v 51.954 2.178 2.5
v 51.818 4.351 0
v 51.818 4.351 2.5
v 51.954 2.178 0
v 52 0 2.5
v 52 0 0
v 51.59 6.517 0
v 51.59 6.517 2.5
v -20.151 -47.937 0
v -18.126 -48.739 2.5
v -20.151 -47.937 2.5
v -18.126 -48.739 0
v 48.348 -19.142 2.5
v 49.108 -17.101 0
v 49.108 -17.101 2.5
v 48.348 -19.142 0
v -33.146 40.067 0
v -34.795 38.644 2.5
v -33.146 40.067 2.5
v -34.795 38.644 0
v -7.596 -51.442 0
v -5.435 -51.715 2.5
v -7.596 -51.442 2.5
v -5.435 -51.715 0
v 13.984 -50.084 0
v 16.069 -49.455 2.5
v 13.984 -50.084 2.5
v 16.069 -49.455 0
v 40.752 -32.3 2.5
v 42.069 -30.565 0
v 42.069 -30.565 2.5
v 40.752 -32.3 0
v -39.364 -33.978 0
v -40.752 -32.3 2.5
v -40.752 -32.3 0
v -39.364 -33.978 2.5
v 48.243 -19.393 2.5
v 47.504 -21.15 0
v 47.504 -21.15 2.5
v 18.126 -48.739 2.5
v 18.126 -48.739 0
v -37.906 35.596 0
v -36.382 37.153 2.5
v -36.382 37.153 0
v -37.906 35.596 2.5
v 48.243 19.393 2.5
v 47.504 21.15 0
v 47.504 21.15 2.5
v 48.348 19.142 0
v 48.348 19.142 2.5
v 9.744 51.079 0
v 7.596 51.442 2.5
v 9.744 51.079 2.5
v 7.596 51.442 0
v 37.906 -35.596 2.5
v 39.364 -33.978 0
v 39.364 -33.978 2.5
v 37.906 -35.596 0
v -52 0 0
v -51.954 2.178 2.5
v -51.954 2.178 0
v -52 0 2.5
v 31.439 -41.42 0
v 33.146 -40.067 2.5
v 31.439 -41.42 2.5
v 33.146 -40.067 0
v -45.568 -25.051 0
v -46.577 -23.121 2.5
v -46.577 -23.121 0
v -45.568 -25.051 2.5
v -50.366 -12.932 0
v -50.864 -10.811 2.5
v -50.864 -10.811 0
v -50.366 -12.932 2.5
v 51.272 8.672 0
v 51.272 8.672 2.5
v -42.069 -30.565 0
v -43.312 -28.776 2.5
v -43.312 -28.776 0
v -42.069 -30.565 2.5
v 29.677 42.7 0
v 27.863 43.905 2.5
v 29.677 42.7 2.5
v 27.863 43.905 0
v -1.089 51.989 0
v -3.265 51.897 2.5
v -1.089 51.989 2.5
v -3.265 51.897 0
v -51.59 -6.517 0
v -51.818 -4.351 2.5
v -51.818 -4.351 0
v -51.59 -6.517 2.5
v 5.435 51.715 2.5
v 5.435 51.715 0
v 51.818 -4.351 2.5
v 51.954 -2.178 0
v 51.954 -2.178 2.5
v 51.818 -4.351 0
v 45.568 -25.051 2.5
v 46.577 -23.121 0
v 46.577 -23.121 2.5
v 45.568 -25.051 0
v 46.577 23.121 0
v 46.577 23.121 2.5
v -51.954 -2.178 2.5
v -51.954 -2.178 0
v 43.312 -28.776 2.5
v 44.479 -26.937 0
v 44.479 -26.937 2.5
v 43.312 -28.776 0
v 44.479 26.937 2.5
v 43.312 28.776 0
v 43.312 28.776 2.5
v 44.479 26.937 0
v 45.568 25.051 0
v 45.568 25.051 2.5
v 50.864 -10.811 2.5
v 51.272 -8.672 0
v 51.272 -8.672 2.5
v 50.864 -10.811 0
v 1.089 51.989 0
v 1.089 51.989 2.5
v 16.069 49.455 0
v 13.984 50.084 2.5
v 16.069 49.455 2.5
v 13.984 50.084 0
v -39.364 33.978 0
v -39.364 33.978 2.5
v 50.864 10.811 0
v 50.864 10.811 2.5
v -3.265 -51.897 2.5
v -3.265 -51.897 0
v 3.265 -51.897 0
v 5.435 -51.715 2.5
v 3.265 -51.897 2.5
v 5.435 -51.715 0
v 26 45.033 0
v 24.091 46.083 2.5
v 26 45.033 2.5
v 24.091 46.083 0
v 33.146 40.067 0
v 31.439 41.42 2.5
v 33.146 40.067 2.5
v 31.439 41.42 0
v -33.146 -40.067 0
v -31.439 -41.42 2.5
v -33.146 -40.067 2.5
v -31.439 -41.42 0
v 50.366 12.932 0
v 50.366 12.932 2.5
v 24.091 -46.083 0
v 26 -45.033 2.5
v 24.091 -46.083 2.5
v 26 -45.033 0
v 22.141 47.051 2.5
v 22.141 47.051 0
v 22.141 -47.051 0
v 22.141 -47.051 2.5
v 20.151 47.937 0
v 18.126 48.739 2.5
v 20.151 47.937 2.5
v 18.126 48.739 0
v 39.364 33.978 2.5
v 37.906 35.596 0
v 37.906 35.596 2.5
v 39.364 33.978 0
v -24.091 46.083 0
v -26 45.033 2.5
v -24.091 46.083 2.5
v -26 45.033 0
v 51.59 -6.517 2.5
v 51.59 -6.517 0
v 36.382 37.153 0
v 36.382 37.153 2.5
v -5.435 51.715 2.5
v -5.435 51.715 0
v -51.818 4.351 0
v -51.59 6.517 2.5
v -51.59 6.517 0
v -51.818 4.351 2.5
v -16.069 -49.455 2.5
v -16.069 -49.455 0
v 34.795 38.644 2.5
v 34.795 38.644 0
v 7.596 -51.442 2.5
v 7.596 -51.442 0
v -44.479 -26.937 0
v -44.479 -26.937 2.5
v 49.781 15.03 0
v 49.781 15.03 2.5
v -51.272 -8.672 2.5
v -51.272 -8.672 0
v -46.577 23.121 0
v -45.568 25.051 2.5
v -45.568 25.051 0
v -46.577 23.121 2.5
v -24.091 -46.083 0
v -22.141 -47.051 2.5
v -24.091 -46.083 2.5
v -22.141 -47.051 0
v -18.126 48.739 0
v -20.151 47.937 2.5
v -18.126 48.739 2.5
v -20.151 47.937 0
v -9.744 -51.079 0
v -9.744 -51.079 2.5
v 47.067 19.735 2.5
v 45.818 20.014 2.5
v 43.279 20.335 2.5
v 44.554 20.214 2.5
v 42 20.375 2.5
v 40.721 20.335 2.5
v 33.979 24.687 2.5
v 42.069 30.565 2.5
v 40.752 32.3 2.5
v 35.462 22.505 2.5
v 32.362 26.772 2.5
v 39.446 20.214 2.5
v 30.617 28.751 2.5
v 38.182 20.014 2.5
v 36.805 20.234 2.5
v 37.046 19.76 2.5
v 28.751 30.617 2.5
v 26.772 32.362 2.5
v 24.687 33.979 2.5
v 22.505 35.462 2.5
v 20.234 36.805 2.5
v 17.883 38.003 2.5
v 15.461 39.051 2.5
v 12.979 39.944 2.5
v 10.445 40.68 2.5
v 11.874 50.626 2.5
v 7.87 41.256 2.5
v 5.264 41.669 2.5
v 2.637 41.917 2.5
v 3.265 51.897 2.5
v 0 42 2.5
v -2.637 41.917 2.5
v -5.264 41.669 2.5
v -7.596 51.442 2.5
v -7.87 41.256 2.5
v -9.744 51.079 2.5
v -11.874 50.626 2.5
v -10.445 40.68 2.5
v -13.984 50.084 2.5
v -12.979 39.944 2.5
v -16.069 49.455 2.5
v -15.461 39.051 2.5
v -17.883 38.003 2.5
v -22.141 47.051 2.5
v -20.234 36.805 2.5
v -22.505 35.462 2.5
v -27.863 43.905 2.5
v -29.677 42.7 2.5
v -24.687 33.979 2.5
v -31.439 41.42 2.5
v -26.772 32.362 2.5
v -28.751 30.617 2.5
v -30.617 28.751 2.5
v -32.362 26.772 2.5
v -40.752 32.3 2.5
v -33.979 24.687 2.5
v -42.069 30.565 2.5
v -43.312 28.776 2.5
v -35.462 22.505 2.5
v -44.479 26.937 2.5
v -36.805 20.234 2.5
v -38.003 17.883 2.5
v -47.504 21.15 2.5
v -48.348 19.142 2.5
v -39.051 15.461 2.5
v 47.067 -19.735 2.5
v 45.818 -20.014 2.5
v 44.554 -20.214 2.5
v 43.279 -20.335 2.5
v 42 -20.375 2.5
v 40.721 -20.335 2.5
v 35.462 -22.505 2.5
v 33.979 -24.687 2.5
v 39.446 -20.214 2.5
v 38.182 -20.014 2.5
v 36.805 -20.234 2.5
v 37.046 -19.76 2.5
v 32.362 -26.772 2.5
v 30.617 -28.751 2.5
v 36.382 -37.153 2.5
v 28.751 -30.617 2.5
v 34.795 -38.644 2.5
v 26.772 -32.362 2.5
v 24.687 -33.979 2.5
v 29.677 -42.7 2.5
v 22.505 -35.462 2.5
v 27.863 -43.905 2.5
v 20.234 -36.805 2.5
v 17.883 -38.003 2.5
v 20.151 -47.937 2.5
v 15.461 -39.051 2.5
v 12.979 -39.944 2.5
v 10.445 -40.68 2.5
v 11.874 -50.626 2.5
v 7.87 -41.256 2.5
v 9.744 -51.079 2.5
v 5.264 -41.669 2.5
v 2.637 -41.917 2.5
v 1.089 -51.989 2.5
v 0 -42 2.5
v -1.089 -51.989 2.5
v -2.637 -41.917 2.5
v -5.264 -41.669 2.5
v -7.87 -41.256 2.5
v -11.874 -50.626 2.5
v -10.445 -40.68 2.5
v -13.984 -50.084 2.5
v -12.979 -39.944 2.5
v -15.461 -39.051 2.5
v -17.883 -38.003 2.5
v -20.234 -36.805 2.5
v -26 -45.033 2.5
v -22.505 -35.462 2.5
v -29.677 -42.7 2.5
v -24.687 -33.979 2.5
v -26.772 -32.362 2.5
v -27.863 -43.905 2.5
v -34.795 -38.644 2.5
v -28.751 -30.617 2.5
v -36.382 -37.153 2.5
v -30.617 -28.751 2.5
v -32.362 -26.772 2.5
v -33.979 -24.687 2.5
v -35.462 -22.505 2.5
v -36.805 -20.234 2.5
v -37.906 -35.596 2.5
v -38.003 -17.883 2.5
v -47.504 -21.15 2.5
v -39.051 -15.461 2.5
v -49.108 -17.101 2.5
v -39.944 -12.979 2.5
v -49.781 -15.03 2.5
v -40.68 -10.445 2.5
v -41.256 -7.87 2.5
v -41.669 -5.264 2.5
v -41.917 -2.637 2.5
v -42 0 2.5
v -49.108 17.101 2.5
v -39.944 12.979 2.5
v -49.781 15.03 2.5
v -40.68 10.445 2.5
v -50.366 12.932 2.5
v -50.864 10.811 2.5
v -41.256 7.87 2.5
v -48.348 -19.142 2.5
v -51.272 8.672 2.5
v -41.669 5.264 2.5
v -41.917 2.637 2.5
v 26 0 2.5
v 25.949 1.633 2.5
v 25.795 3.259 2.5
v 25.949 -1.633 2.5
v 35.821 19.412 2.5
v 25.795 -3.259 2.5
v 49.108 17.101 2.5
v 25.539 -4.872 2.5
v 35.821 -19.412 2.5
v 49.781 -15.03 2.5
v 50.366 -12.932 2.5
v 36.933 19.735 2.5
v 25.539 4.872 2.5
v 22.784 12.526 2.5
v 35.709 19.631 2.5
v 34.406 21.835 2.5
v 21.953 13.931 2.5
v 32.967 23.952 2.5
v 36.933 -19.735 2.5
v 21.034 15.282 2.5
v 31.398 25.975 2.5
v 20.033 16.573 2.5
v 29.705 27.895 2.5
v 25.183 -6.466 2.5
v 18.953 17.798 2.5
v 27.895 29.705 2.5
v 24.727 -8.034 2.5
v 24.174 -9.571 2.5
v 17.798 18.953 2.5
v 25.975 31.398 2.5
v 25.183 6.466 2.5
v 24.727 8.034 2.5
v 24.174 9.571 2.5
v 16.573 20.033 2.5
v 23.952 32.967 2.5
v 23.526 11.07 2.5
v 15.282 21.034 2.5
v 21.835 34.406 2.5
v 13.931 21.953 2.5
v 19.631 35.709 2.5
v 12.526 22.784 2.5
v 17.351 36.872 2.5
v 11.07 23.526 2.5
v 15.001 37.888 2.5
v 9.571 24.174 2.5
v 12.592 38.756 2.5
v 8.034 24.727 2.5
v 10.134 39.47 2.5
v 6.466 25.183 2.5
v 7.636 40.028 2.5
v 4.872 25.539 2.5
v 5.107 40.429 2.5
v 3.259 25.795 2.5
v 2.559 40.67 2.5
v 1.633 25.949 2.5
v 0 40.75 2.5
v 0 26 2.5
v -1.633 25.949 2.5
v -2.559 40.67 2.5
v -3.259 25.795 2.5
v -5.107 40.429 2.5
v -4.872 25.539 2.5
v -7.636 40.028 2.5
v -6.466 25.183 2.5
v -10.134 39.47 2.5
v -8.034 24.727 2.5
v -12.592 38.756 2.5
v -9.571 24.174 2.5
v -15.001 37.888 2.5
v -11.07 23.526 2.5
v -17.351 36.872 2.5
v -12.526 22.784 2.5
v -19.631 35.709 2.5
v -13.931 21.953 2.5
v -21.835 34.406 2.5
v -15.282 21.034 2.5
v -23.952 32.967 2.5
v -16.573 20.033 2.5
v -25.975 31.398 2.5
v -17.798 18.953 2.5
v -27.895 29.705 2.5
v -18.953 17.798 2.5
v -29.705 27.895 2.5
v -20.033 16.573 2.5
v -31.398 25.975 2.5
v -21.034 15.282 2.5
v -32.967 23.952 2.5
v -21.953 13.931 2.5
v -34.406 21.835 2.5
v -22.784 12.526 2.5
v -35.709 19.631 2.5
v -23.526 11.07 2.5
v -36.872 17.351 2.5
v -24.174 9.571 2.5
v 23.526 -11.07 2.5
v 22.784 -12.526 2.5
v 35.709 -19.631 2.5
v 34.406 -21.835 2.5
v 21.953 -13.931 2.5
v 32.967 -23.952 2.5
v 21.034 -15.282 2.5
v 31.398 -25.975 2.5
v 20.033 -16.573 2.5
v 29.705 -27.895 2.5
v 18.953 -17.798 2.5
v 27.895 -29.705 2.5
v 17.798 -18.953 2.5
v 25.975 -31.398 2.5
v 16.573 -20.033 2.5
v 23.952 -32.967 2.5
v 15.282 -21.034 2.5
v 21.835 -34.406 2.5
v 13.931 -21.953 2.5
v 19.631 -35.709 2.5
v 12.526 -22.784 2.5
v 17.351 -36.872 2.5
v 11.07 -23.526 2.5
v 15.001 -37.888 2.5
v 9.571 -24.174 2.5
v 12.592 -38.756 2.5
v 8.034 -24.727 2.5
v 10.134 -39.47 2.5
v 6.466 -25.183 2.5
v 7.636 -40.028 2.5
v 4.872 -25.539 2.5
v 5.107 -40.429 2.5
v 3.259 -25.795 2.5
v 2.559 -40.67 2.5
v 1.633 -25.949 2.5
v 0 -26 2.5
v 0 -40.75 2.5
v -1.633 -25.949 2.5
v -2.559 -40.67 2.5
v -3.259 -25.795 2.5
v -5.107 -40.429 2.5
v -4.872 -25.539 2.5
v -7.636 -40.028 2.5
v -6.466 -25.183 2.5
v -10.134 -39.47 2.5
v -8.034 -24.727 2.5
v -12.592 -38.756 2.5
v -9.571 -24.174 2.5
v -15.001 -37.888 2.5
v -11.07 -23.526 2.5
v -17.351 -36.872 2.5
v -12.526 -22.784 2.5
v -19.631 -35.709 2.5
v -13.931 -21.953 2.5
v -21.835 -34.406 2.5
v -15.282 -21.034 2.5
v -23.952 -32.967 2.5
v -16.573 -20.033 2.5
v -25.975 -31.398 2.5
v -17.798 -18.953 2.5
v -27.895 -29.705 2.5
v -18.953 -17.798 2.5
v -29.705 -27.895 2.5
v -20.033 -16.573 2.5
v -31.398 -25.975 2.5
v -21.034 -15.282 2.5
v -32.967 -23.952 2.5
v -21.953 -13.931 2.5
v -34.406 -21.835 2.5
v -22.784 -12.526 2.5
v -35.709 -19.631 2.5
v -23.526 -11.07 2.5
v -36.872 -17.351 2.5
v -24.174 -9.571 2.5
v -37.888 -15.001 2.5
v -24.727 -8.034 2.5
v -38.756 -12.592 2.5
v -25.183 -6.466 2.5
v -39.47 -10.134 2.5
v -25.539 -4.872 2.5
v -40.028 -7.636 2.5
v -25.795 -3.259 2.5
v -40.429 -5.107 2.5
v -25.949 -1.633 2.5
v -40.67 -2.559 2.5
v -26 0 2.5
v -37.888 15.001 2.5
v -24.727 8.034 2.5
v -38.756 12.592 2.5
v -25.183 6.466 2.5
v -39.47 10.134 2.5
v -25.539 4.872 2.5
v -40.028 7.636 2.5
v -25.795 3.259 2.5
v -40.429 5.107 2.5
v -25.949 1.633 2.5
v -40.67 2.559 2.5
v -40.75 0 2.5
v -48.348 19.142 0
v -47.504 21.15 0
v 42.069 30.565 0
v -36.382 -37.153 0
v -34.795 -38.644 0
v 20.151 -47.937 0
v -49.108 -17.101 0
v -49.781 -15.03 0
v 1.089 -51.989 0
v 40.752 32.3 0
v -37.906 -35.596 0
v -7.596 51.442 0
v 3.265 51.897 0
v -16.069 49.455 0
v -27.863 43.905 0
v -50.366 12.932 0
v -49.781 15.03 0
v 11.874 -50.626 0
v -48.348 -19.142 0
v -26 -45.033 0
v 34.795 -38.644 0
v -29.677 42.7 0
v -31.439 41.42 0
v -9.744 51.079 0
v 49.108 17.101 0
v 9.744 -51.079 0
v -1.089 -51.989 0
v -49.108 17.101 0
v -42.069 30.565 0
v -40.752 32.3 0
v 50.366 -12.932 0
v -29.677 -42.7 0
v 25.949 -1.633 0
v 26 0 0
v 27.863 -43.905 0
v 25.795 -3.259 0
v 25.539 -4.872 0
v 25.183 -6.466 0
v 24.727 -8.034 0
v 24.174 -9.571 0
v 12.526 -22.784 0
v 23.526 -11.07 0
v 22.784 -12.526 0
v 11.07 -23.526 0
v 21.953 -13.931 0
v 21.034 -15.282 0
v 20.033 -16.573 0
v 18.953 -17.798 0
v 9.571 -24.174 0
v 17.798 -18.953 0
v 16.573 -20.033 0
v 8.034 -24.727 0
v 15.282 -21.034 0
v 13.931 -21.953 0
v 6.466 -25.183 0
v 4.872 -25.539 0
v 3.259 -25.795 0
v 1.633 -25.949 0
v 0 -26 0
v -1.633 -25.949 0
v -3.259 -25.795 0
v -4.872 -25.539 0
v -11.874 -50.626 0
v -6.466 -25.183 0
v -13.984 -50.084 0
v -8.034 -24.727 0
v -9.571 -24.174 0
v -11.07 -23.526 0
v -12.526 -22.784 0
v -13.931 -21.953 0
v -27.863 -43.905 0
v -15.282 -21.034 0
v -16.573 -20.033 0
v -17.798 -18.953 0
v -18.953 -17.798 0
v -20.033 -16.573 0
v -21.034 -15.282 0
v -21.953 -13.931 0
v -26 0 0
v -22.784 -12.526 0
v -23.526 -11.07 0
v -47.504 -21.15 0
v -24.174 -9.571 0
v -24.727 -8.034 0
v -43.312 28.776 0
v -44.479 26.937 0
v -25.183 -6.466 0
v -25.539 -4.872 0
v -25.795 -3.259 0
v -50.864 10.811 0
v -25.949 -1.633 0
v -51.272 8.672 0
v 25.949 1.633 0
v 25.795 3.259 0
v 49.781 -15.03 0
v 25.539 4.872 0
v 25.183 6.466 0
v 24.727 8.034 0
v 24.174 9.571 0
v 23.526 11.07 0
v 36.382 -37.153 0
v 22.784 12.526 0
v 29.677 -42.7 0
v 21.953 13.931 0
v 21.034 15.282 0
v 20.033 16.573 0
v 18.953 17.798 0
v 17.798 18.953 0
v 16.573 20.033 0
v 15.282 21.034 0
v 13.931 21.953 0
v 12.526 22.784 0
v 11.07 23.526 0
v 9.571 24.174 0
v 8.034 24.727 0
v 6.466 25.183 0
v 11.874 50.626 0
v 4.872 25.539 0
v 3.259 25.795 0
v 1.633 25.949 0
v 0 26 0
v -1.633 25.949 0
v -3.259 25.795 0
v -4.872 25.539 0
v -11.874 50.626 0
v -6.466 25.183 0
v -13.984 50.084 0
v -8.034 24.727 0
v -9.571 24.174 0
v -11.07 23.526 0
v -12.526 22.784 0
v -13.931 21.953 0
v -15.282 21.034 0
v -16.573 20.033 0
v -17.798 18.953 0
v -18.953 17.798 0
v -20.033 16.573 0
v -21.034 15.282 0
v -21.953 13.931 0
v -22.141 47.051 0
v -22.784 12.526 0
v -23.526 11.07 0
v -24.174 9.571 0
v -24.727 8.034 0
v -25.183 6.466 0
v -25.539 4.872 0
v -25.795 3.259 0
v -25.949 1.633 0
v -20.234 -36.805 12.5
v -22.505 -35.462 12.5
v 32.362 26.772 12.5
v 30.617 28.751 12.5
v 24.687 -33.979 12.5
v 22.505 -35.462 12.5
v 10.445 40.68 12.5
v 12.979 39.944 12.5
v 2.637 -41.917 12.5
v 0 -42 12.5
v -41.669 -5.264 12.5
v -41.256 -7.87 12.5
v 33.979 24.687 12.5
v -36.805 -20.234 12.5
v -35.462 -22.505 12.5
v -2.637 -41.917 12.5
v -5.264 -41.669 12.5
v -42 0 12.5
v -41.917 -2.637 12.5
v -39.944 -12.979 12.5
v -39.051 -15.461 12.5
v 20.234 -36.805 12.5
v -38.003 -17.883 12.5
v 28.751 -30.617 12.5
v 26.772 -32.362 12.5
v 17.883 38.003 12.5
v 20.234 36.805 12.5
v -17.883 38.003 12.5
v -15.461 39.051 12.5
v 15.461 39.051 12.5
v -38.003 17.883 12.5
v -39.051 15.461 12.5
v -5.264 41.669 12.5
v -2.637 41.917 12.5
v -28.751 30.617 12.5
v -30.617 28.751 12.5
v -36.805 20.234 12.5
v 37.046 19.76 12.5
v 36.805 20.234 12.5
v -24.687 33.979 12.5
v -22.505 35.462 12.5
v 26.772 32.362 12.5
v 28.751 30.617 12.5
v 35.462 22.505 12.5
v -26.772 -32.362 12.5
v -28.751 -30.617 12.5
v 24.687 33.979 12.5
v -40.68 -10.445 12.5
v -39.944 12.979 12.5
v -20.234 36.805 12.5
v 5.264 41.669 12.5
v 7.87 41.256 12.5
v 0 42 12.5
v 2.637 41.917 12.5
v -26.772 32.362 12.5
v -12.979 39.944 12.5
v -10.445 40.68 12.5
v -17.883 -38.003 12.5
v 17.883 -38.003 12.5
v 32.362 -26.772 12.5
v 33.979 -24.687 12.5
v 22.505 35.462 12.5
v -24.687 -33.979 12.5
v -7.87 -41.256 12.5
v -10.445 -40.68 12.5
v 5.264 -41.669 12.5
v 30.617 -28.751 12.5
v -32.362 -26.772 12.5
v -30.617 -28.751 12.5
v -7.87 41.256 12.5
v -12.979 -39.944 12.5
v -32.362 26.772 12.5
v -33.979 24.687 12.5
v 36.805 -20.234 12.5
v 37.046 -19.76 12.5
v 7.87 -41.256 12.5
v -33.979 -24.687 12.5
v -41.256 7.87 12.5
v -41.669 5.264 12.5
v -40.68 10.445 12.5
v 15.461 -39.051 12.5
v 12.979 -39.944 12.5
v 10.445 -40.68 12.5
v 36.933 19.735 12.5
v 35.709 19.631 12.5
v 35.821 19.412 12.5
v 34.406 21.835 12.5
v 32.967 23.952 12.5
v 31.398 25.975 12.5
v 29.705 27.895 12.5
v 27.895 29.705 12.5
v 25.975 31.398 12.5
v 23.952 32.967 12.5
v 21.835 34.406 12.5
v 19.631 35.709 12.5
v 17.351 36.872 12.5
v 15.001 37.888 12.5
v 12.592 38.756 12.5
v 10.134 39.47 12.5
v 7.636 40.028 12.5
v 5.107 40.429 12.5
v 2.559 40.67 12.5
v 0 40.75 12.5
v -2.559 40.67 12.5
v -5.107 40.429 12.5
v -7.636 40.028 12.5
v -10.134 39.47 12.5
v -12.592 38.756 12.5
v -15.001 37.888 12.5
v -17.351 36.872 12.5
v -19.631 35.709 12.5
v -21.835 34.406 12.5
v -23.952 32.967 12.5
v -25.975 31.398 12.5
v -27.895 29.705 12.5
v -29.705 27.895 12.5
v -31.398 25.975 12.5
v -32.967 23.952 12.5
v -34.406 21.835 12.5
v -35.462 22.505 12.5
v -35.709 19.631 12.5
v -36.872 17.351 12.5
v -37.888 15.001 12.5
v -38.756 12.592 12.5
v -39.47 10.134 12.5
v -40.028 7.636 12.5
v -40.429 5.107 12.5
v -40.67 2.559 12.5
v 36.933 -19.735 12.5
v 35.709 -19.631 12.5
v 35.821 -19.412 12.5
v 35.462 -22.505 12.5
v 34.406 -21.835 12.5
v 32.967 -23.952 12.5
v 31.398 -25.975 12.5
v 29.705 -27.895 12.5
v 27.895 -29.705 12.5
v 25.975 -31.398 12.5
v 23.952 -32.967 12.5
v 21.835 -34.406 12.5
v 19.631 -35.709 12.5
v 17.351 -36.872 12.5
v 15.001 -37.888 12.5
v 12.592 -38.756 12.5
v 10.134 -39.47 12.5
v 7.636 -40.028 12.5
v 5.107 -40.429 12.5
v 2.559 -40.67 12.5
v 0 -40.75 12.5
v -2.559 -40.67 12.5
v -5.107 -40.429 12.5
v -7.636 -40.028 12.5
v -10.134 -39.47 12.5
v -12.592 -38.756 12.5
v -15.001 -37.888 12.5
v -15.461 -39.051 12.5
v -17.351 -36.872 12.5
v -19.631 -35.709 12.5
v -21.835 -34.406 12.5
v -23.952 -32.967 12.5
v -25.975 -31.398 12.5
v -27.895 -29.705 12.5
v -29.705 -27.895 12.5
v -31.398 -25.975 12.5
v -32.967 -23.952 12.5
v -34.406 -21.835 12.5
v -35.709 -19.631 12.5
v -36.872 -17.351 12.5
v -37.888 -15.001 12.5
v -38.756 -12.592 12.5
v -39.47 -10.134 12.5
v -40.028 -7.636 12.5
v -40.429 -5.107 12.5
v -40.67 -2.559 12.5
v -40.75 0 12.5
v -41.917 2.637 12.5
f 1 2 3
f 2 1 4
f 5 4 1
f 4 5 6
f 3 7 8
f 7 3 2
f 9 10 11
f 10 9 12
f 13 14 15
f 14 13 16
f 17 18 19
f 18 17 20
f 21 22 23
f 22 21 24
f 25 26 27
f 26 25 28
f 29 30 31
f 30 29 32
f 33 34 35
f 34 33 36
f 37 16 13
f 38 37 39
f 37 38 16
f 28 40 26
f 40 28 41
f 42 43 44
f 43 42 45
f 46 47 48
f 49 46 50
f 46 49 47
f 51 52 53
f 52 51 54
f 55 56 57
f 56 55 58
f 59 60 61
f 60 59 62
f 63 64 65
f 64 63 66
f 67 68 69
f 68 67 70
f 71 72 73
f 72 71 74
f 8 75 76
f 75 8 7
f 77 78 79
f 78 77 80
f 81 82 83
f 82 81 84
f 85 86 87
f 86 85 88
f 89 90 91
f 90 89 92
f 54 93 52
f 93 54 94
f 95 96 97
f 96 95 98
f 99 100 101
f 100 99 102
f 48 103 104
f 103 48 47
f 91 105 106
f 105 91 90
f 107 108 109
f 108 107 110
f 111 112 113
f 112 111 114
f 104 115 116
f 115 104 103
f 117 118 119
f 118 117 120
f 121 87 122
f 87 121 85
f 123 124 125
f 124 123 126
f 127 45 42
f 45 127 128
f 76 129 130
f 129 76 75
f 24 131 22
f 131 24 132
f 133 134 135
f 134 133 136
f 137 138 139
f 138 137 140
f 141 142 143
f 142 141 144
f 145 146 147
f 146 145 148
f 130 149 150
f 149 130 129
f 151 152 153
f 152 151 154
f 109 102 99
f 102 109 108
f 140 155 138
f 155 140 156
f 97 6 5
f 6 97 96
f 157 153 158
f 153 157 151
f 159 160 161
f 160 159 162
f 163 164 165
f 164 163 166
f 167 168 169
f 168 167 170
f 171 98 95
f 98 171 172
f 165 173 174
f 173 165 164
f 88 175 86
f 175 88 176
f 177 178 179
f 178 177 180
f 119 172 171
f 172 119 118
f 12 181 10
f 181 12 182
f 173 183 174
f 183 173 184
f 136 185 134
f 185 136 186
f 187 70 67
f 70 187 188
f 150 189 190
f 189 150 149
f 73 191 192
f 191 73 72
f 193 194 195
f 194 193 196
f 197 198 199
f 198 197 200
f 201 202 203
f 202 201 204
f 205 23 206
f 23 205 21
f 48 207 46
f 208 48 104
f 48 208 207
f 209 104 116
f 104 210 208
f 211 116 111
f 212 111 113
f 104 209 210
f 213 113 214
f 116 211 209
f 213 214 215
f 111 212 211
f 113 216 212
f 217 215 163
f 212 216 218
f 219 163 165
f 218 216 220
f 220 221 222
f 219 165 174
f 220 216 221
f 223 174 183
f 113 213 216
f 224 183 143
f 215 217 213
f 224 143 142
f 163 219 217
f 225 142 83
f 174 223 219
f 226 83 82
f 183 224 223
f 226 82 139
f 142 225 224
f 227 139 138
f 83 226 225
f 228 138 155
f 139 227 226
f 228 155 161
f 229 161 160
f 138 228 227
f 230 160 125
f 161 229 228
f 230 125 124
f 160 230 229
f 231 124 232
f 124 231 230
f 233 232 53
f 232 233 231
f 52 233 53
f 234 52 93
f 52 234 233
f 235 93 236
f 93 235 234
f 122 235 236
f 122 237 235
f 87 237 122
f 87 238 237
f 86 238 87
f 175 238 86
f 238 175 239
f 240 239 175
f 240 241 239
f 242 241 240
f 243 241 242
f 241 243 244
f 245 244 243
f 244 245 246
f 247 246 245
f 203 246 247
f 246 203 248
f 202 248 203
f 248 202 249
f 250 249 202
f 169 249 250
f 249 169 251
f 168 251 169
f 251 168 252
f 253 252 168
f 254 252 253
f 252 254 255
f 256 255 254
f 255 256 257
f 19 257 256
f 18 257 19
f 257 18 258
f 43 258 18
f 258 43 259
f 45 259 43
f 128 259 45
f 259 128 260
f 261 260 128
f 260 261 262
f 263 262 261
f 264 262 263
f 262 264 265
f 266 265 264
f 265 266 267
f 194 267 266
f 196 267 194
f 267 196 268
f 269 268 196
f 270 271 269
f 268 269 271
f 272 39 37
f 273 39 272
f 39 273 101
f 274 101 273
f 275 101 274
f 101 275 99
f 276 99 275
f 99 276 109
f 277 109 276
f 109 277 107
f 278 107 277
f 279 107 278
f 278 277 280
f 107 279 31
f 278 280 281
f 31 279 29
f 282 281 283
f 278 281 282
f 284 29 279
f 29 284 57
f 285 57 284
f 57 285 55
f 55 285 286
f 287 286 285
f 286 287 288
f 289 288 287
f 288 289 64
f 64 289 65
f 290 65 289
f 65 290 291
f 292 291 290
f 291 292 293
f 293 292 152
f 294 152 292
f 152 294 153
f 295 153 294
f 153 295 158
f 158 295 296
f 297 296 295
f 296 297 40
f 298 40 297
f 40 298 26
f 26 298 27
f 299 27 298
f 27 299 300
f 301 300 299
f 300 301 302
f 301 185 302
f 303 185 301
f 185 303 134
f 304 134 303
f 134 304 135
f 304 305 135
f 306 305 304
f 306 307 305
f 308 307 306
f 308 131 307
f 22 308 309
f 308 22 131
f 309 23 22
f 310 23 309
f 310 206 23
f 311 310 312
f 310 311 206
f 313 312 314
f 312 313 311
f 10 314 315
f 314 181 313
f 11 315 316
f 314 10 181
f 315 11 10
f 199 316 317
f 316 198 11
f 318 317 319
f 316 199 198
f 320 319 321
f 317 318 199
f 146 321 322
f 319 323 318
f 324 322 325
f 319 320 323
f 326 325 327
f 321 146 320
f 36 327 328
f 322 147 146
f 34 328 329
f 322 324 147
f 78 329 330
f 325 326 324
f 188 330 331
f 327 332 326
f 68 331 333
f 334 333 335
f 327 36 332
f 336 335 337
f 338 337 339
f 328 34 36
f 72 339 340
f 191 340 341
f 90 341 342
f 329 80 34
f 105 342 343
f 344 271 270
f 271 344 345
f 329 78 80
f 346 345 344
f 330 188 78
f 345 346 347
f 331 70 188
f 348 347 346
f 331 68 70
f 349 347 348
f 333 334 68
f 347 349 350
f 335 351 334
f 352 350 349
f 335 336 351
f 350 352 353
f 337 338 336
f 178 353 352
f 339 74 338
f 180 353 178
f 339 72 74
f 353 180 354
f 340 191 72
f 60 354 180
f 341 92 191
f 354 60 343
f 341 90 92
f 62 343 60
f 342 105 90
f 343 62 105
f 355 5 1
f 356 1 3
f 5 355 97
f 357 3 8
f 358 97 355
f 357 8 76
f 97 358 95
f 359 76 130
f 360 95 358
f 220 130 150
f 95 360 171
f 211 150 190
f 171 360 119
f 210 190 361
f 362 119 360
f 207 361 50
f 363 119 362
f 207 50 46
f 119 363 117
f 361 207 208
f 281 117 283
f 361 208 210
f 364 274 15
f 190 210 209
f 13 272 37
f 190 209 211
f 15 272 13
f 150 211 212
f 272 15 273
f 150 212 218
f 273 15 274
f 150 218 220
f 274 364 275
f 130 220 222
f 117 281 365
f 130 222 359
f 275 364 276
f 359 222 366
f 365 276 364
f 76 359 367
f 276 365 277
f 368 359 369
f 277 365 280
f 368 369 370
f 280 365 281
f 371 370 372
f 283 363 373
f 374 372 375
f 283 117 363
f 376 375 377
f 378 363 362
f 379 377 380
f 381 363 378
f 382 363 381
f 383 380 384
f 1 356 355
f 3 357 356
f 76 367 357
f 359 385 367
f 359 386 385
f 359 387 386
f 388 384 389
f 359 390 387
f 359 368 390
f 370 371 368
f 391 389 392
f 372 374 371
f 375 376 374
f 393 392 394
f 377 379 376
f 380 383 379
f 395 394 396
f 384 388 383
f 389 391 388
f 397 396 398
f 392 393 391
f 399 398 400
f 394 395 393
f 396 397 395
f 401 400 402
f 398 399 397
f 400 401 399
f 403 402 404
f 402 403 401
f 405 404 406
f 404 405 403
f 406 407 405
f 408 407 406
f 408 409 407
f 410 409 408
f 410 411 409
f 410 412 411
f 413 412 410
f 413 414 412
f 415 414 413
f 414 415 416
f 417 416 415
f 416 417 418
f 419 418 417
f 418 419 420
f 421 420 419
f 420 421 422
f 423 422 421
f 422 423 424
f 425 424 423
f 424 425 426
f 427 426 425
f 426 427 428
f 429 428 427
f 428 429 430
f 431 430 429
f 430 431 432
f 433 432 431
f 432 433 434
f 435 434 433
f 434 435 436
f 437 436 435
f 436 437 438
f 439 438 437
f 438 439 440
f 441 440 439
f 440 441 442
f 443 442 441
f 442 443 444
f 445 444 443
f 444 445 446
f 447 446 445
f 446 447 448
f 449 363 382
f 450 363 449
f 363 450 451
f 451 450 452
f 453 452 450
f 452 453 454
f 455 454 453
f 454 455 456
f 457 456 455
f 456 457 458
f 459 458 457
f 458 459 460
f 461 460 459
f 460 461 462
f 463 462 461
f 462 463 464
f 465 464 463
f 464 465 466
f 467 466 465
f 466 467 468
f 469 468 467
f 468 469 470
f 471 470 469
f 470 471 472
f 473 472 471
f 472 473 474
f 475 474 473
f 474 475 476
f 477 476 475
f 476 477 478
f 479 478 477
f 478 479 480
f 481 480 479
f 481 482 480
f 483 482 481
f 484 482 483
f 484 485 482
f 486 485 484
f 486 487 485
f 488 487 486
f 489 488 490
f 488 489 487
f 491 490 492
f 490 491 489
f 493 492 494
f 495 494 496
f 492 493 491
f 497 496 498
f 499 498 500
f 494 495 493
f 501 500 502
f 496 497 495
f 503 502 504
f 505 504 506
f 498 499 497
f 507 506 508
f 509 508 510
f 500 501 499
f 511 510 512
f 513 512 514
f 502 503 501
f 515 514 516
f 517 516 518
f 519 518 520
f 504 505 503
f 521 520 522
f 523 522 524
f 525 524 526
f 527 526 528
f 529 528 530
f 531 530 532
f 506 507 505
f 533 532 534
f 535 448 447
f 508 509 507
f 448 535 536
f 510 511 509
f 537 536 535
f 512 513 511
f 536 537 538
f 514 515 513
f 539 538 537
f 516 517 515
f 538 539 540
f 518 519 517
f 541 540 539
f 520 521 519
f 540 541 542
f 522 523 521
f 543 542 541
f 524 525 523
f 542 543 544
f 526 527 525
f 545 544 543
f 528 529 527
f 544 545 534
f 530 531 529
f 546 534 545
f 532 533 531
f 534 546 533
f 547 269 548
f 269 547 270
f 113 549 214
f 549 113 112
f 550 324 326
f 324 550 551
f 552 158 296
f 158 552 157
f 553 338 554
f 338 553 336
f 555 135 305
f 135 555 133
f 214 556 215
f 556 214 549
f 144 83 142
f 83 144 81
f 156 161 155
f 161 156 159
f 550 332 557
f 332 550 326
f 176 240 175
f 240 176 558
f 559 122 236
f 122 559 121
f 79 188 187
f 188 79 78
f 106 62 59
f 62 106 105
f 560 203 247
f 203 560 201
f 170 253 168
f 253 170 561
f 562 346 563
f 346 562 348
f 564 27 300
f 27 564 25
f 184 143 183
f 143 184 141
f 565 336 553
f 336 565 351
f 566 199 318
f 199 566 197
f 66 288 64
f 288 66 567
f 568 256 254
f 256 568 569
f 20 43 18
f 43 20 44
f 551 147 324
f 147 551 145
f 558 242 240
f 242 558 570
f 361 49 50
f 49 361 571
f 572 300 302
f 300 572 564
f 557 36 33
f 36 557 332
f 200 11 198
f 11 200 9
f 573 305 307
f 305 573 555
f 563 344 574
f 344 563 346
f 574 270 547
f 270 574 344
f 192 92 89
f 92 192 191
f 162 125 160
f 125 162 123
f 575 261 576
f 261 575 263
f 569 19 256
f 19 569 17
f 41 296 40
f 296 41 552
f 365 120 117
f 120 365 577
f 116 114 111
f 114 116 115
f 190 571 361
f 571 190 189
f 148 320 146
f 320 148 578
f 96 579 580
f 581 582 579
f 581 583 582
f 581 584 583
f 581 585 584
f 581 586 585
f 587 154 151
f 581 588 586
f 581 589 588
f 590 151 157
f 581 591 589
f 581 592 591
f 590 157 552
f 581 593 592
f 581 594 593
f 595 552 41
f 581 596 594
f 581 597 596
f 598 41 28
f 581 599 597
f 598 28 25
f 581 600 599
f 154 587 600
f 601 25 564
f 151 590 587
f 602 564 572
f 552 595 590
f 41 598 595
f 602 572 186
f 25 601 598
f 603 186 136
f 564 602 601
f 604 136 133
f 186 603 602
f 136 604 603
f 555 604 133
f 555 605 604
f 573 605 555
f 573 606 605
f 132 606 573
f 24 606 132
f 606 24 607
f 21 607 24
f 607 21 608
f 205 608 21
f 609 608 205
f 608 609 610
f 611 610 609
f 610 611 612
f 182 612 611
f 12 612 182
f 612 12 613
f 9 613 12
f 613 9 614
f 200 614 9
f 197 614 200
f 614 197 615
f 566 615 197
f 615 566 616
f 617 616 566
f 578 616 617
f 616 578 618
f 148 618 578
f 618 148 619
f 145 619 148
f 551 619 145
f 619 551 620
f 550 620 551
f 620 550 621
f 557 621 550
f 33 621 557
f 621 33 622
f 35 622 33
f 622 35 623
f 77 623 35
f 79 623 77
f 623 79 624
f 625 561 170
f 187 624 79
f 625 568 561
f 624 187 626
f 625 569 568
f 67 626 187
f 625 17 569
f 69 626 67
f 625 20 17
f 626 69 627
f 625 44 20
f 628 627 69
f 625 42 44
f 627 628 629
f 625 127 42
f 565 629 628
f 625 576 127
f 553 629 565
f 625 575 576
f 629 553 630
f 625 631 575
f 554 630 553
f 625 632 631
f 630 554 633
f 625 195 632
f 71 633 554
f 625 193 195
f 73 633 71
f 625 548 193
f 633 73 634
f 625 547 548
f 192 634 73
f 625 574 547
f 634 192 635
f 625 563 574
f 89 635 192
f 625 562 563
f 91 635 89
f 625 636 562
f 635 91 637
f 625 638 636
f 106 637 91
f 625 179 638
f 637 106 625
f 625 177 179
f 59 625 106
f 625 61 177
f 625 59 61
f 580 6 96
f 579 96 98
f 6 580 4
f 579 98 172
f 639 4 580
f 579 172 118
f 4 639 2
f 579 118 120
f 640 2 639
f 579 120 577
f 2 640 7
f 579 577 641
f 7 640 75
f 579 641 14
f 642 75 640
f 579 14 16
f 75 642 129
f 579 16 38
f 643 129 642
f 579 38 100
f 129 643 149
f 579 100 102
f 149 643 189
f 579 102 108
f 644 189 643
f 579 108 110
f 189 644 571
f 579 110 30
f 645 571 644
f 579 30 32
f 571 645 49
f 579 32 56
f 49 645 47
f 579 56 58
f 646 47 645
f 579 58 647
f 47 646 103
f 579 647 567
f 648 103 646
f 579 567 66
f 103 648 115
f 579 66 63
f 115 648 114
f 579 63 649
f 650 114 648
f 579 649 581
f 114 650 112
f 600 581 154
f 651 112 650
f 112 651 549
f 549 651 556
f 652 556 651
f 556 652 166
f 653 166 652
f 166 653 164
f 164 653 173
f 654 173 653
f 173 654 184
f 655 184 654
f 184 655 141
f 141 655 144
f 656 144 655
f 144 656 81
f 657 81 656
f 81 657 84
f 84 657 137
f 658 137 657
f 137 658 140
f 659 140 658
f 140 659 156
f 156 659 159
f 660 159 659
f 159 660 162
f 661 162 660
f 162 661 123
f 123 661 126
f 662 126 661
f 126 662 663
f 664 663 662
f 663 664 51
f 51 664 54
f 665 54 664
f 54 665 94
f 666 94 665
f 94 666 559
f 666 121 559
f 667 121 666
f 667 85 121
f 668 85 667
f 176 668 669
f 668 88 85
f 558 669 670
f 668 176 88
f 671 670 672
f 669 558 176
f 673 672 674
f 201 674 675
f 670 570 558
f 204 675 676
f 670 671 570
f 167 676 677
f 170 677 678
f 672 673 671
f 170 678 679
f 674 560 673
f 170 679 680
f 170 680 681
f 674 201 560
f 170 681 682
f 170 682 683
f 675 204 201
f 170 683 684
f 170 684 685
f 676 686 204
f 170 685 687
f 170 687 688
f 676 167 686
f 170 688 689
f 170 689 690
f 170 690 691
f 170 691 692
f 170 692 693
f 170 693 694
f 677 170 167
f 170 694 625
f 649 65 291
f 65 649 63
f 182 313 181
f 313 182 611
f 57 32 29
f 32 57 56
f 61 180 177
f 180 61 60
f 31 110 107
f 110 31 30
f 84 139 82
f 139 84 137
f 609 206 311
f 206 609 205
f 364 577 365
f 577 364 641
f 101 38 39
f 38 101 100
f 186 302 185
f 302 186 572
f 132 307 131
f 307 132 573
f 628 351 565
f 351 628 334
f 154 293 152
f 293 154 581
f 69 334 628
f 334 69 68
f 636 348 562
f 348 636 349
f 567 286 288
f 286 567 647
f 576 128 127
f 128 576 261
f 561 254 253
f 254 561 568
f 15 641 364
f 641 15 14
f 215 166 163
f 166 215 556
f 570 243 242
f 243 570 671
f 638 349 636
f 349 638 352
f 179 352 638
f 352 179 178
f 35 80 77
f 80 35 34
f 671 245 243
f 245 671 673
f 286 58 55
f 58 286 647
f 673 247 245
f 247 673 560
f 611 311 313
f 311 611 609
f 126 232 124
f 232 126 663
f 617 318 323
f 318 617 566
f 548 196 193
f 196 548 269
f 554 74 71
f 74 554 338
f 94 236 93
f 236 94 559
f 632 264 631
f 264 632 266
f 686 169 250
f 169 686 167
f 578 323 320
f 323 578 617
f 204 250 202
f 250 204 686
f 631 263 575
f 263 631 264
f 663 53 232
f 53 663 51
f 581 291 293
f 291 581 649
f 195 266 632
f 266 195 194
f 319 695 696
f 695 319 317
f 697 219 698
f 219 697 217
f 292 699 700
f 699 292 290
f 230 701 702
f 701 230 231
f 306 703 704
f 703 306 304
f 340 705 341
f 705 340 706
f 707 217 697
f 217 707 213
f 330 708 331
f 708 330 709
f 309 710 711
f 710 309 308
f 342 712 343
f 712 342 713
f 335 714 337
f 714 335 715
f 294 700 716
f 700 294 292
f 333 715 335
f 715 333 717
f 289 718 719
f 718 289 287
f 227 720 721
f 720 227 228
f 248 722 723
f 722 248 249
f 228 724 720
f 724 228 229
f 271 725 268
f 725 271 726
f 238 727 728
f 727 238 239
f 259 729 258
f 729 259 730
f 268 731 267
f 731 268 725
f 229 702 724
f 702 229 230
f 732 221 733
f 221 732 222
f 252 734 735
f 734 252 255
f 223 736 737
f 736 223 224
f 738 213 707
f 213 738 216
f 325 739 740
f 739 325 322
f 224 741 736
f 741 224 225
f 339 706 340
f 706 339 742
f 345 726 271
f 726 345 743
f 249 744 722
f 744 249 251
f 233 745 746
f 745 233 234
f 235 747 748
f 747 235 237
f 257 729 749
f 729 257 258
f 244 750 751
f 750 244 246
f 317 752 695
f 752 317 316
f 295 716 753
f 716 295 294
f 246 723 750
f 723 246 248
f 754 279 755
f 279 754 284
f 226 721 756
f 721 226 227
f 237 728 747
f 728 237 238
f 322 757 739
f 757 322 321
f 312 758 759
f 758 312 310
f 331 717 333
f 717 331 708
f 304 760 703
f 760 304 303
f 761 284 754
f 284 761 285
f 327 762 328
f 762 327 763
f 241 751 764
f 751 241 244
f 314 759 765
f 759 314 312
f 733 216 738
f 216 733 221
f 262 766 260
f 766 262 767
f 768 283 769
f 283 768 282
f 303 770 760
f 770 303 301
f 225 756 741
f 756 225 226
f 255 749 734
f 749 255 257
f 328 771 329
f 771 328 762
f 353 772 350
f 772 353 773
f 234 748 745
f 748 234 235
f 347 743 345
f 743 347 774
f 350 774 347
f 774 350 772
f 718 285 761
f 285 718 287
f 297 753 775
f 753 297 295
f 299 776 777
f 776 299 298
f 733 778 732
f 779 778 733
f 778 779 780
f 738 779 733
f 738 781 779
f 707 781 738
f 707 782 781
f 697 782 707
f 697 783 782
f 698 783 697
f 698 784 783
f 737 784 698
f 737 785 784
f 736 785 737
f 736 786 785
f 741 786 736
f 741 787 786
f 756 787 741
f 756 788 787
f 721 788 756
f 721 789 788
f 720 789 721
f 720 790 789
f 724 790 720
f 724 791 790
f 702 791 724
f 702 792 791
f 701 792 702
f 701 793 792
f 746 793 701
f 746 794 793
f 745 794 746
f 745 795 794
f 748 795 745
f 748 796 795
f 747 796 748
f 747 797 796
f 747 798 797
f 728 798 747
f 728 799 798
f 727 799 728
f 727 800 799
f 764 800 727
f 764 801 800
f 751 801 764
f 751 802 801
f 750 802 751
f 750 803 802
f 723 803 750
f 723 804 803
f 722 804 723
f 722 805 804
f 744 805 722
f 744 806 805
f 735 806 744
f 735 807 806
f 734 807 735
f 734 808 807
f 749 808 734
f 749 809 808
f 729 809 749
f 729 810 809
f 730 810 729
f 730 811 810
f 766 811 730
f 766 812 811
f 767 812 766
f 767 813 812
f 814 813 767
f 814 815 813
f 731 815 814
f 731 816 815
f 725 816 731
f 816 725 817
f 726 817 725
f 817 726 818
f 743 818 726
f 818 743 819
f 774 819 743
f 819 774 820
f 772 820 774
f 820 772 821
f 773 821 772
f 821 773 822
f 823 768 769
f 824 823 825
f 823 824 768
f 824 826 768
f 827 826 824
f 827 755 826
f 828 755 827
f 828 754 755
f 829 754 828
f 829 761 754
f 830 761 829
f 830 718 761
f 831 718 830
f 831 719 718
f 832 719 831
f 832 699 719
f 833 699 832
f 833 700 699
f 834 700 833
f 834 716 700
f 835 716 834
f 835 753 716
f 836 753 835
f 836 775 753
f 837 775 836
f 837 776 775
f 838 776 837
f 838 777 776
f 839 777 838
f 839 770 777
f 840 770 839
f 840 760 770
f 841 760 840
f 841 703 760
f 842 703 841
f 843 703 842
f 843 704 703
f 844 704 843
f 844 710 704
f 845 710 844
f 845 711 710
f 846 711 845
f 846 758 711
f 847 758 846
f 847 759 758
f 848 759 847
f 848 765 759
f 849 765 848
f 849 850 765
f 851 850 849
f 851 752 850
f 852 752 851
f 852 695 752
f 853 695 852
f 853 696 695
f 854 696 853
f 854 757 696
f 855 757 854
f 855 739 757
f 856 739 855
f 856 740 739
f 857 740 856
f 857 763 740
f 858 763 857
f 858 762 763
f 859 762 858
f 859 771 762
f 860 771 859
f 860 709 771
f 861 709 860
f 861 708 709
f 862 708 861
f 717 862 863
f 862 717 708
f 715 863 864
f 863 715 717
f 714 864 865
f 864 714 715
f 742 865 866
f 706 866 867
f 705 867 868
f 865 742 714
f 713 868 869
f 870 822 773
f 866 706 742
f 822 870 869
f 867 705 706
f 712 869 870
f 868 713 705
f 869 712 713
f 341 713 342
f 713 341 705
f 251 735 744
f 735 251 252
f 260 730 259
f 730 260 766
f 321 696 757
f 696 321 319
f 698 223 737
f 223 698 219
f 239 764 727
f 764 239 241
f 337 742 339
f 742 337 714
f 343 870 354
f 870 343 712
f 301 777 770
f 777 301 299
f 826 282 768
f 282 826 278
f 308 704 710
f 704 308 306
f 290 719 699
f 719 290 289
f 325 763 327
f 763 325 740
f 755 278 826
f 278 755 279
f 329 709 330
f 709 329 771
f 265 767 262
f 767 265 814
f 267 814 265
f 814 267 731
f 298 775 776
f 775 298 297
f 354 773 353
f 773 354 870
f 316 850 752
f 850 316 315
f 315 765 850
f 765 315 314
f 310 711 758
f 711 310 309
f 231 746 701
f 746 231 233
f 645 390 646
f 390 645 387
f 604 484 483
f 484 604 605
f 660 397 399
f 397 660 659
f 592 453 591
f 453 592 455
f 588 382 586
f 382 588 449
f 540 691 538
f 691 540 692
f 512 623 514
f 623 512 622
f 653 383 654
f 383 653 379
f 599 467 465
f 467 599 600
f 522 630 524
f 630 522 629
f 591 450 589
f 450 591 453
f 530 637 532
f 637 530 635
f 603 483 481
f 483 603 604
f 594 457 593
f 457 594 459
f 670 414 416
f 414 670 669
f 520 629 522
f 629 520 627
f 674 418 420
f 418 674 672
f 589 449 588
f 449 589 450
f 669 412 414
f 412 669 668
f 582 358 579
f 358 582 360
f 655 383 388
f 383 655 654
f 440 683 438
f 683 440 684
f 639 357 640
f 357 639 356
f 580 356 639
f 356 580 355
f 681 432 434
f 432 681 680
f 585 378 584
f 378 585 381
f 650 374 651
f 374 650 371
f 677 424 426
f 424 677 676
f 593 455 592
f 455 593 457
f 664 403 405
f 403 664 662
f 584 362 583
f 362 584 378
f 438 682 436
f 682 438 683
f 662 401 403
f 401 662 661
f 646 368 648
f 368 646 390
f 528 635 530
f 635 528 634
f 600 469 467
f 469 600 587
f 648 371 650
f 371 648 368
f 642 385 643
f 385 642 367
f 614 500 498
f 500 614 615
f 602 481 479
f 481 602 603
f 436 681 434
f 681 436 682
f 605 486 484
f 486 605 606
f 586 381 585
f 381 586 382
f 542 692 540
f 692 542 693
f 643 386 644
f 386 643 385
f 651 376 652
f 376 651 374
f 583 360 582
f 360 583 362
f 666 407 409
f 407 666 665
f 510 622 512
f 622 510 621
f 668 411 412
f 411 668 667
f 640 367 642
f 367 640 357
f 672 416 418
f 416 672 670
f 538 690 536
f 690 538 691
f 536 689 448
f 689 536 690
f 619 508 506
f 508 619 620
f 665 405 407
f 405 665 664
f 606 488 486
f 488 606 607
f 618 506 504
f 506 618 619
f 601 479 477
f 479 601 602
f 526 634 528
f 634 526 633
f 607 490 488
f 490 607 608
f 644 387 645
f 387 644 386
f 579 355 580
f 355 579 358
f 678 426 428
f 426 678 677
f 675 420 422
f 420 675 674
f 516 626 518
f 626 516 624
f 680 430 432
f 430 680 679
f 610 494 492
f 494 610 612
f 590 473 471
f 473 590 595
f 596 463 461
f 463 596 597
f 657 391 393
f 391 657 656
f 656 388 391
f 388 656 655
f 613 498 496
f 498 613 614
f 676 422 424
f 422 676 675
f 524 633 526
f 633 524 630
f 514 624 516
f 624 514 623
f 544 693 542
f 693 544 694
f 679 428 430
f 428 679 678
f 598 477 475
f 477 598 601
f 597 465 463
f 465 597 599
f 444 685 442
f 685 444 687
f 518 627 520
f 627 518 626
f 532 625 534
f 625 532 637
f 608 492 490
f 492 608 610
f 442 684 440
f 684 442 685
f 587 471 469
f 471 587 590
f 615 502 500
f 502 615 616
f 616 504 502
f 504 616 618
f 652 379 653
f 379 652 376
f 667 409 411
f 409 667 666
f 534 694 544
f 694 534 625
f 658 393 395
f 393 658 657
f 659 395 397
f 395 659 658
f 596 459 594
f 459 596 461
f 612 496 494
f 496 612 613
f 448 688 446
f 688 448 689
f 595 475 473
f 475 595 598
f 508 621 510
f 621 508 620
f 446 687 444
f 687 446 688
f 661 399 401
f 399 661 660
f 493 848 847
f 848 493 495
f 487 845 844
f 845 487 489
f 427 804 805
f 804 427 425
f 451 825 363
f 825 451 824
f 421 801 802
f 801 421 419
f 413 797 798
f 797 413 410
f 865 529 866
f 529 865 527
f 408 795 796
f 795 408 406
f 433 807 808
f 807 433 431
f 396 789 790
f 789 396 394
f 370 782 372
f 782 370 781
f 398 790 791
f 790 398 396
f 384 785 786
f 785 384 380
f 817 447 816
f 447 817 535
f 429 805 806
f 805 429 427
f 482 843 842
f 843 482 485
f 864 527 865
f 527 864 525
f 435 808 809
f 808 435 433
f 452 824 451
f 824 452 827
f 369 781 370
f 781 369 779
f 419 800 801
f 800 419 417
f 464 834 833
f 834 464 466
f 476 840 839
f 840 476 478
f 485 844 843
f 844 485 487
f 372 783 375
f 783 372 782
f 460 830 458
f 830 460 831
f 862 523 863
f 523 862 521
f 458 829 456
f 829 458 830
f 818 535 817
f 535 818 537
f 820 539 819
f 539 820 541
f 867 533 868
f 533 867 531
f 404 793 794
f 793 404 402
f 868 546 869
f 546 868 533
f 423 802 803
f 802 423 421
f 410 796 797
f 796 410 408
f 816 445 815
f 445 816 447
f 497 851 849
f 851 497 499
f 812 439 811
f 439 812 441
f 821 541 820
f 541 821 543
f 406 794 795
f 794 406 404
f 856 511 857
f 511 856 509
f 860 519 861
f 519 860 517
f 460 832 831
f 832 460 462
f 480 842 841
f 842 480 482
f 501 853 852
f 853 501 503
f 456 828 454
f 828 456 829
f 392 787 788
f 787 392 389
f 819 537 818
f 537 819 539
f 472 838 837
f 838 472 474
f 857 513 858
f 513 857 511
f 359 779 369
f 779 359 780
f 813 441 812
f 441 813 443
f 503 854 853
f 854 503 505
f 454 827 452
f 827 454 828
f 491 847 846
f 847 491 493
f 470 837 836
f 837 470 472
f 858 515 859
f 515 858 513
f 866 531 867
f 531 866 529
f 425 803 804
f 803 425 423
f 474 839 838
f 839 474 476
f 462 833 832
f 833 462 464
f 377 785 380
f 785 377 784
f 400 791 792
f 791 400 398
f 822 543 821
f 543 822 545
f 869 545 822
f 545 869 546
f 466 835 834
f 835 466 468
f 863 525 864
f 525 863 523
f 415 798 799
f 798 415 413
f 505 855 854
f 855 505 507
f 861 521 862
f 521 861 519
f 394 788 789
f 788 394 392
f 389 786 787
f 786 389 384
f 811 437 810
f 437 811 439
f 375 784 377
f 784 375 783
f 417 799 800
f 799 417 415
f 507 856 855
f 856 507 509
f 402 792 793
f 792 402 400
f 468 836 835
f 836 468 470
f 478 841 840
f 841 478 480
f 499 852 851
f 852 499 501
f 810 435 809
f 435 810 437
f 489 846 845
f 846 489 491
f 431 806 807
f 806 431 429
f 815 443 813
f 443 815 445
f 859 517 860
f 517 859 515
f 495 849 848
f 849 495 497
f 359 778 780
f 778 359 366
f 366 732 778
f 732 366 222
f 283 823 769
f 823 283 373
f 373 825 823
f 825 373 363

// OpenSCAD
thickness = 2.5 ;
spool_diameter = 51 ;
spool_second_diameter = 84 ;
radial_offset = 28 ;
radial_diameter = 20 ;
/*difference() {
	union() {
		cylinder( r1 = spool_diameter/2, r2 = spool_diameter/2+10, h = thickness+6.1, $fn = 150 );

		translate([0,0,thickness]) 
			cylinder(r = spool_diameter/2, h = 40, $fn = 100);
	}
	translate([0,0,-0.1]) union() {
		cylinder( r = radial_diameter/2, h = thickness+0.3 );
		for( i = [0:2] ) {
			rotate([0,0,i*120]) translate( [radial_offset,0,0] )
				cylinder( r = radial_diameter/2, h = thickness+0.3 );
		}
		translate([0,0,thickness]) cylinder(r = (spool_diameter-thickness)/2, h = 40+0.2, $fn = 100);
	}
}
	translate([spool_diameter/2+spool_second_diameter/2+20,0,0])*/
	difference() {
		union() {
			cylinder( r = spool_second_diameter/2+10, h = thickness, $fn = 150 );
			translate([0,0,thickness]) 
				cylinder(r = spool_second_diameter/2, h = 10, $fn = 100);
		}
	
		translate([0,0,0]) 
			cylinder(r = spool_diameter/2+0.5, h = 40, $fn = 100);
		translate([0,0,thickness]) 
			cylinder(r = (spool_second_diameter-thickness)/2, h = 10.2, $fn = 100);
		translate([spool_second_diameter/2,0,thickness]) 
			cylinder(r = (spool_second_diameter-thickness)/4, h = 10.2, $fn = 100);
	}
